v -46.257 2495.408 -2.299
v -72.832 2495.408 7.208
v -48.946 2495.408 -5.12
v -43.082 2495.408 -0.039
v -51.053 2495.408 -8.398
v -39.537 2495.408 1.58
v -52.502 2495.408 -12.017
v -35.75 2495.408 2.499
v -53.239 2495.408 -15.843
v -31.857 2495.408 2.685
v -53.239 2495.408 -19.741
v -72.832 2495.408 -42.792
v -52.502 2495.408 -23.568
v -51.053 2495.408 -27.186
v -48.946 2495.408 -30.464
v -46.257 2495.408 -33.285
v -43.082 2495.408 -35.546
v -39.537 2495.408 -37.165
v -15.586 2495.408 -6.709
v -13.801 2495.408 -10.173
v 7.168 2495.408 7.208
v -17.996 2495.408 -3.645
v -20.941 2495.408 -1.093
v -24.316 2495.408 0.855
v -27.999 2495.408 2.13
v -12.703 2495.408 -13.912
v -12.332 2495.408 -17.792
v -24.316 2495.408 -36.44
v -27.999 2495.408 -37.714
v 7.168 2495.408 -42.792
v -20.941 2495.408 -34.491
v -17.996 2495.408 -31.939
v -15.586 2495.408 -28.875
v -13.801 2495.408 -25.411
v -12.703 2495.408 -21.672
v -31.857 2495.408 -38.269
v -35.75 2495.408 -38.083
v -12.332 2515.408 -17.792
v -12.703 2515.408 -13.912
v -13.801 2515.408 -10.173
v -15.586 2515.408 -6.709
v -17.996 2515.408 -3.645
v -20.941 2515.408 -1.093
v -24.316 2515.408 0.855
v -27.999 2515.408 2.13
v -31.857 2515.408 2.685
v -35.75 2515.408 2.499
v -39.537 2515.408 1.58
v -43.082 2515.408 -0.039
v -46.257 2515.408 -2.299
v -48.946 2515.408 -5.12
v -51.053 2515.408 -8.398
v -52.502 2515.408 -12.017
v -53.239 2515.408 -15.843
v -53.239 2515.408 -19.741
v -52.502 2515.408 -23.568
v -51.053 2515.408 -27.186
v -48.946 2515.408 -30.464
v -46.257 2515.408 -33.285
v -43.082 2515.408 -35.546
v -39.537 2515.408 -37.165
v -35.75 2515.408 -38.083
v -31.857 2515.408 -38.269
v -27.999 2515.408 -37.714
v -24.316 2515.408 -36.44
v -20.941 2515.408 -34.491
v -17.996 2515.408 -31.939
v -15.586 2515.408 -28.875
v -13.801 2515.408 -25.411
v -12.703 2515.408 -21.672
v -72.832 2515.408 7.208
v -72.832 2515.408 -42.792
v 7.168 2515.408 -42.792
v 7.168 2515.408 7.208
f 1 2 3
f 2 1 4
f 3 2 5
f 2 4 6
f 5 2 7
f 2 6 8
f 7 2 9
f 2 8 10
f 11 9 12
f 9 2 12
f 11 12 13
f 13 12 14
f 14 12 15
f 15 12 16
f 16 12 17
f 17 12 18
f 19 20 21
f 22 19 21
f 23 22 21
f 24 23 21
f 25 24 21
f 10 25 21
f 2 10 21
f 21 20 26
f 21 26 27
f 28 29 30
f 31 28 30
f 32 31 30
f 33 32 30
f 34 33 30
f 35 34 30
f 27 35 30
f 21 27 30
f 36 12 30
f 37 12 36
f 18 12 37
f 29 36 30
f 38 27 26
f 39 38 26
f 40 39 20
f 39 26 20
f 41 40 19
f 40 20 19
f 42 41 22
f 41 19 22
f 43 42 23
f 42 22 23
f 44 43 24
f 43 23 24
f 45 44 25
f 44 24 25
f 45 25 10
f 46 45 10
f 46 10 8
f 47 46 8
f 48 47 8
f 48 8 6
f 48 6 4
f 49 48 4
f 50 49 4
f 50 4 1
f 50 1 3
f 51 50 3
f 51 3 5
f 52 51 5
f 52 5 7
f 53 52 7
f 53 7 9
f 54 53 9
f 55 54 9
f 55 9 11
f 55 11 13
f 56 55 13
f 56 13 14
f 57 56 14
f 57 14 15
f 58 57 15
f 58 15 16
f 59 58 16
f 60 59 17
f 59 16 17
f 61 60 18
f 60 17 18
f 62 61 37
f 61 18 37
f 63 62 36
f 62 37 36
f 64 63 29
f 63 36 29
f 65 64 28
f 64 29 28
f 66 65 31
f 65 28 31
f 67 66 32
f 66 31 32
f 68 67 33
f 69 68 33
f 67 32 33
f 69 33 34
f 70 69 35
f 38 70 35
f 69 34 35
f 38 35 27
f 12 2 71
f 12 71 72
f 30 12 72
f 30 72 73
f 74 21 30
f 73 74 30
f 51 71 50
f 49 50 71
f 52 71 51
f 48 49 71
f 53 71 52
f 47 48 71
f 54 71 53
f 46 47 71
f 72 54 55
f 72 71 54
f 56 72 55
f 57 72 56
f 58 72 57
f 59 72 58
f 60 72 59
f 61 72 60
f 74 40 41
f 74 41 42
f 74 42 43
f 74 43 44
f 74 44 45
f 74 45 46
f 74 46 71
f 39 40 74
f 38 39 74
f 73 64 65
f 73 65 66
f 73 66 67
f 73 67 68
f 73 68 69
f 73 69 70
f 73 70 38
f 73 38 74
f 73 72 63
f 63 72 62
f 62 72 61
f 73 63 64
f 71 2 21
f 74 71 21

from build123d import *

# Parameters (mm, degrees)
SKETCH1_W           = 80
SKETCH1_H           = 50
BOSS_EXTRUDE1_DEPTH = 20
CUT_EXTRUDE1_REACH  = 22
SKETCH2_R           = 20.5


with BuildPart() as part:
    # Sketch1 → Boss-Extrude1 (new body)
    with BuildSketch(Plane(origin=(0, 2495.407712162, 0), x_dir=(1, 0, 0), z_dir=(0, 1, 0))):
        with Locations((-32.832129773, 17.792108153)):
            Rectangle(SKETCH1_W, SKETCH1_H)
    extrude(amount=BOSS_EXTRUDE1_DEPTH)

    # Sketch2 → Cut-Extrude1 (cut, up to next)
    with BuildSketch(Plane.XZ.offset(-2495.407712162), mode=Mode.PRIVATE) as cut_extrude1_sk1:
        with Locations((-32.832129773, -17.792108153)):
            Circle(SKETCH2_R)
    cut_extrude1_tool1 = extrude(cut_extrude1_sk1.sketch, amount=-CUT_EXTRUDE1_REACH, mode=Mode.PRIVATE) & part.part
    add(cut_extrude1_tool1.solids().sort_by_distance((-32.83213, 2495.407712, -17.792108))[0], mode=Mode.SUBTRACT)


solid = part.part
